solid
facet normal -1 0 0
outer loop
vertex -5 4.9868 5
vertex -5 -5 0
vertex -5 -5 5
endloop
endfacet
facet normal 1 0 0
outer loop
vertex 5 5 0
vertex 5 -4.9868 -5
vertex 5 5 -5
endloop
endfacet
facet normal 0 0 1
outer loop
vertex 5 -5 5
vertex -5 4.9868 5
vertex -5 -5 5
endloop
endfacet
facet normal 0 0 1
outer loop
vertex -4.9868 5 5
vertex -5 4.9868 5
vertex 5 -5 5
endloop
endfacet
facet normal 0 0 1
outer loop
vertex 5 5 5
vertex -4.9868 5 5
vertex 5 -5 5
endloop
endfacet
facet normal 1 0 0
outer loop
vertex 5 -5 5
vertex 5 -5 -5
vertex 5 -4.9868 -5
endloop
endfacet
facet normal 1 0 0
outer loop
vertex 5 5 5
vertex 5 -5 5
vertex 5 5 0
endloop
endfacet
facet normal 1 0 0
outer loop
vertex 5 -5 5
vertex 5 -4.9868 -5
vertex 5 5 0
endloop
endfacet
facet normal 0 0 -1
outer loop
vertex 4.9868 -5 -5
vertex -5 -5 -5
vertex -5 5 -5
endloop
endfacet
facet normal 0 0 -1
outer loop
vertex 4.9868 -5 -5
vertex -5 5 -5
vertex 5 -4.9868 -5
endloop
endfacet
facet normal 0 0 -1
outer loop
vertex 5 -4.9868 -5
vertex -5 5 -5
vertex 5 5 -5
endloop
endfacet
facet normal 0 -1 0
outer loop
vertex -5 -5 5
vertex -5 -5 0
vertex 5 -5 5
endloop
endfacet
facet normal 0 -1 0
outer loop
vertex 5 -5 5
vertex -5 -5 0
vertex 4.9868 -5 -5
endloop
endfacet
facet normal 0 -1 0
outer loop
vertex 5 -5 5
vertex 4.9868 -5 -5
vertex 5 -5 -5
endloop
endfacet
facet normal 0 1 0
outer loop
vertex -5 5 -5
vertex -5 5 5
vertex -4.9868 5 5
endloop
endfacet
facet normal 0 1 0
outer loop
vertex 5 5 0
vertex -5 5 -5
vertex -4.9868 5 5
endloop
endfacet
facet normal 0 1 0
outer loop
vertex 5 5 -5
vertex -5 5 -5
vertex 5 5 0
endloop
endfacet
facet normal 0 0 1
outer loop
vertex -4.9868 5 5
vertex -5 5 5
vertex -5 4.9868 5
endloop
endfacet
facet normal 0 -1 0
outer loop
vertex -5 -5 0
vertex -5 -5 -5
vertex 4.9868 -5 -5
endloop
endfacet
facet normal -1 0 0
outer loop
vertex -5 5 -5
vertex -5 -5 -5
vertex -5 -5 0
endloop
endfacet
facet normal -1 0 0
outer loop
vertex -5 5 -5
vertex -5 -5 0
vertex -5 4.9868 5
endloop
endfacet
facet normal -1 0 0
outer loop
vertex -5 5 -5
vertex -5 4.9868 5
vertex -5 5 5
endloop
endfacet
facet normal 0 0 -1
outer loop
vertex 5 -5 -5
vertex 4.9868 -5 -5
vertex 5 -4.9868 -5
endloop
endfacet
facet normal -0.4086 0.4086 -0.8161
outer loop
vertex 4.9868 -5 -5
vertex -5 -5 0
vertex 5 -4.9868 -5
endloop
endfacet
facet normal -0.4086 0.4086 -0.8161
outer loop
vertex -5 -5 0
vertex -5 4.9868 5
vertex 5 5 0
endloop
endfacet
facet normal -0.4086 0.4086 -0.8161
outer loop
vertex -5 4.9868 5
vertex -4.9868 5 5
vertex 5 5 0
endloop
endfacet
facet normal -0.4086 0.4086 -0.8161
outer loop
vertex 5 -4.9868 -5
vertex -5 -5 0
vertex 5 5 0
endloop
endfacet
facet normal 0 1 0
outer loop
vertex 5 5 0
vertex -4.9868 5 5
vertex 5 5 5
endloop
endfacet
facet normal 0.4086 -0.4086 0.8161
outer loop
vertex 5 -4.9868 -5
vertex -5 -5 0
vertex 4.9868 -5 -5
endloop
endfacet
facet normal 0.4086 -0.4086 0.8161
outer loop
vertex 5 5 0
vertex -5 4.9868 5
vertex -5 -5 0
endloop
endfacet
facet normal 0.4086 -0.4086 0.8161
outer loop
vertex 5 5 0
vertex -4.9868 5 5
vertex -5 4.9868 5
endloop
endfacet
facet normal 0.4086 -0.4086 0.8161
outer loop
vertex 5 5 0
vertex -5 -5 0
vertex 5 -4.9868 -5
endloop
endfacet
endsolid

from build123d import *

# Parameters (mm, degrees)
BOX001_W               = 30
BOX001_H               = 30
BOX001_DEPTH           = 30
BOX001_ROLL_ANGLE      = 26.595273
BOX001_PITCH_ANGLE     = 24.117362
BOX001_PLACEMENT_ANGLE = 5.780823
BOX_W                  = 10
BOX_H                  = 10
BOX_DEPTH              = 10
BOX003_W               = 30
BOX003_H               = 30
BOX003_DEPTH           = 30
BOX003_ROLL_ANGLE      = 26.595273
BOX003_PITCH_ANGLE     = 24.117362
BOX003_PLACEMENT_ANGLE = 5.780823
BOX002_W               = 10
BOX002_H               = 10
BOX002_DEPTH           = 10


with BuildPart() as cube001:
    # Box001 → Box001 (new body)
    with BuildSketch(Plane.XY):
        with Locations((15, 15)):
            Rectangle(BOX001_W, BOX001_H)
    extrude(amount=BOX001_DEPTH)


with BuildPart() as cube001_1:
    # Box001 roll: moved
    add(cube001.part.rotate(Axis((0, 0, 0), (1, 0, 0)), BOX001_ROLL_ANGLE))


with BuildPart() as cube001_2:
    # Box001 pitch: moved
    add(cube001_1.part.rotate(Axis((0, 0, 0), (0, 1, 0)), BOX001_PITCH_ANGLE))


with BuildPart() as cube001_3:
    # Box001 placement: moved
    add(cube001_2.part.moved(Location((-15, -15, 0))).rotate(Axis((-15, -15, 0), (0, 0, 1)), BOX001_PLACEMENT_ANGLE))


with BuildPart() as cut:
    # Box → Box (new body)
    with BuildSketch(Plane(origin=(-5, -5, -5), x_dir=(1, 0, 0), z_dir=(0, 0, 1))):
        with Locations((5, 5)):
            Rectangle(BOX_W, BOX_H)
    extrude(amount=BOX_DEPTH)

    # Cut: cut Cube001
    add(cube001_3.part, mode=Mode.SUBTRACT)


with BuildPart() as cube003:
    # Box003 → Box003 (new body)
    with BuildSketch(Plane.XY):
        with Locations((15, 15)):
            Rectangle(BOX003_W, BOX003_H)
    extrude(amount=BOX003_DEPTH)


with BuildPart() as cube003_1:
    # Box003 roll: moved
    add(cube003.part.rotate(Axis((0, 0, 0), (1, 0, 0)), BOX003_ROLL_ANGLE))


with BuildPart() as cube003_2:
    # Box003 pitch: moved
    add(cube003_1.part.rotate(Axis((0, 0, 0), (0, 1, 0)), BOX003_PITCH_ANGLE))


with BuildPart() as cube003_3:
    # Box003 placement: moved
    add(cube003_2.part.moved(Location((-15, -15, 0))).rotate(Axis((-15, -15, 0), (0, 0, 1)), BOX003_PLACEMENT_ANGLE))


with BuildPart() as common:
    # Box002 → Box002 (new body)
    with BuildSketch(Plane(origin=(-5, -5, -5), x_dir=(1, 0, 0), z_dir=(0, 0, 1))):
        with Locations((5, 5)):
            Rectangle(BOX002_W, BOX002_H)
    extrude(amount=BOX002_DEPTH)

    # Common: intersect Cube003
    add(cube003_3.part, mode=Mode.INTERSECT)


solid = Compound([cut.part, common.part])
